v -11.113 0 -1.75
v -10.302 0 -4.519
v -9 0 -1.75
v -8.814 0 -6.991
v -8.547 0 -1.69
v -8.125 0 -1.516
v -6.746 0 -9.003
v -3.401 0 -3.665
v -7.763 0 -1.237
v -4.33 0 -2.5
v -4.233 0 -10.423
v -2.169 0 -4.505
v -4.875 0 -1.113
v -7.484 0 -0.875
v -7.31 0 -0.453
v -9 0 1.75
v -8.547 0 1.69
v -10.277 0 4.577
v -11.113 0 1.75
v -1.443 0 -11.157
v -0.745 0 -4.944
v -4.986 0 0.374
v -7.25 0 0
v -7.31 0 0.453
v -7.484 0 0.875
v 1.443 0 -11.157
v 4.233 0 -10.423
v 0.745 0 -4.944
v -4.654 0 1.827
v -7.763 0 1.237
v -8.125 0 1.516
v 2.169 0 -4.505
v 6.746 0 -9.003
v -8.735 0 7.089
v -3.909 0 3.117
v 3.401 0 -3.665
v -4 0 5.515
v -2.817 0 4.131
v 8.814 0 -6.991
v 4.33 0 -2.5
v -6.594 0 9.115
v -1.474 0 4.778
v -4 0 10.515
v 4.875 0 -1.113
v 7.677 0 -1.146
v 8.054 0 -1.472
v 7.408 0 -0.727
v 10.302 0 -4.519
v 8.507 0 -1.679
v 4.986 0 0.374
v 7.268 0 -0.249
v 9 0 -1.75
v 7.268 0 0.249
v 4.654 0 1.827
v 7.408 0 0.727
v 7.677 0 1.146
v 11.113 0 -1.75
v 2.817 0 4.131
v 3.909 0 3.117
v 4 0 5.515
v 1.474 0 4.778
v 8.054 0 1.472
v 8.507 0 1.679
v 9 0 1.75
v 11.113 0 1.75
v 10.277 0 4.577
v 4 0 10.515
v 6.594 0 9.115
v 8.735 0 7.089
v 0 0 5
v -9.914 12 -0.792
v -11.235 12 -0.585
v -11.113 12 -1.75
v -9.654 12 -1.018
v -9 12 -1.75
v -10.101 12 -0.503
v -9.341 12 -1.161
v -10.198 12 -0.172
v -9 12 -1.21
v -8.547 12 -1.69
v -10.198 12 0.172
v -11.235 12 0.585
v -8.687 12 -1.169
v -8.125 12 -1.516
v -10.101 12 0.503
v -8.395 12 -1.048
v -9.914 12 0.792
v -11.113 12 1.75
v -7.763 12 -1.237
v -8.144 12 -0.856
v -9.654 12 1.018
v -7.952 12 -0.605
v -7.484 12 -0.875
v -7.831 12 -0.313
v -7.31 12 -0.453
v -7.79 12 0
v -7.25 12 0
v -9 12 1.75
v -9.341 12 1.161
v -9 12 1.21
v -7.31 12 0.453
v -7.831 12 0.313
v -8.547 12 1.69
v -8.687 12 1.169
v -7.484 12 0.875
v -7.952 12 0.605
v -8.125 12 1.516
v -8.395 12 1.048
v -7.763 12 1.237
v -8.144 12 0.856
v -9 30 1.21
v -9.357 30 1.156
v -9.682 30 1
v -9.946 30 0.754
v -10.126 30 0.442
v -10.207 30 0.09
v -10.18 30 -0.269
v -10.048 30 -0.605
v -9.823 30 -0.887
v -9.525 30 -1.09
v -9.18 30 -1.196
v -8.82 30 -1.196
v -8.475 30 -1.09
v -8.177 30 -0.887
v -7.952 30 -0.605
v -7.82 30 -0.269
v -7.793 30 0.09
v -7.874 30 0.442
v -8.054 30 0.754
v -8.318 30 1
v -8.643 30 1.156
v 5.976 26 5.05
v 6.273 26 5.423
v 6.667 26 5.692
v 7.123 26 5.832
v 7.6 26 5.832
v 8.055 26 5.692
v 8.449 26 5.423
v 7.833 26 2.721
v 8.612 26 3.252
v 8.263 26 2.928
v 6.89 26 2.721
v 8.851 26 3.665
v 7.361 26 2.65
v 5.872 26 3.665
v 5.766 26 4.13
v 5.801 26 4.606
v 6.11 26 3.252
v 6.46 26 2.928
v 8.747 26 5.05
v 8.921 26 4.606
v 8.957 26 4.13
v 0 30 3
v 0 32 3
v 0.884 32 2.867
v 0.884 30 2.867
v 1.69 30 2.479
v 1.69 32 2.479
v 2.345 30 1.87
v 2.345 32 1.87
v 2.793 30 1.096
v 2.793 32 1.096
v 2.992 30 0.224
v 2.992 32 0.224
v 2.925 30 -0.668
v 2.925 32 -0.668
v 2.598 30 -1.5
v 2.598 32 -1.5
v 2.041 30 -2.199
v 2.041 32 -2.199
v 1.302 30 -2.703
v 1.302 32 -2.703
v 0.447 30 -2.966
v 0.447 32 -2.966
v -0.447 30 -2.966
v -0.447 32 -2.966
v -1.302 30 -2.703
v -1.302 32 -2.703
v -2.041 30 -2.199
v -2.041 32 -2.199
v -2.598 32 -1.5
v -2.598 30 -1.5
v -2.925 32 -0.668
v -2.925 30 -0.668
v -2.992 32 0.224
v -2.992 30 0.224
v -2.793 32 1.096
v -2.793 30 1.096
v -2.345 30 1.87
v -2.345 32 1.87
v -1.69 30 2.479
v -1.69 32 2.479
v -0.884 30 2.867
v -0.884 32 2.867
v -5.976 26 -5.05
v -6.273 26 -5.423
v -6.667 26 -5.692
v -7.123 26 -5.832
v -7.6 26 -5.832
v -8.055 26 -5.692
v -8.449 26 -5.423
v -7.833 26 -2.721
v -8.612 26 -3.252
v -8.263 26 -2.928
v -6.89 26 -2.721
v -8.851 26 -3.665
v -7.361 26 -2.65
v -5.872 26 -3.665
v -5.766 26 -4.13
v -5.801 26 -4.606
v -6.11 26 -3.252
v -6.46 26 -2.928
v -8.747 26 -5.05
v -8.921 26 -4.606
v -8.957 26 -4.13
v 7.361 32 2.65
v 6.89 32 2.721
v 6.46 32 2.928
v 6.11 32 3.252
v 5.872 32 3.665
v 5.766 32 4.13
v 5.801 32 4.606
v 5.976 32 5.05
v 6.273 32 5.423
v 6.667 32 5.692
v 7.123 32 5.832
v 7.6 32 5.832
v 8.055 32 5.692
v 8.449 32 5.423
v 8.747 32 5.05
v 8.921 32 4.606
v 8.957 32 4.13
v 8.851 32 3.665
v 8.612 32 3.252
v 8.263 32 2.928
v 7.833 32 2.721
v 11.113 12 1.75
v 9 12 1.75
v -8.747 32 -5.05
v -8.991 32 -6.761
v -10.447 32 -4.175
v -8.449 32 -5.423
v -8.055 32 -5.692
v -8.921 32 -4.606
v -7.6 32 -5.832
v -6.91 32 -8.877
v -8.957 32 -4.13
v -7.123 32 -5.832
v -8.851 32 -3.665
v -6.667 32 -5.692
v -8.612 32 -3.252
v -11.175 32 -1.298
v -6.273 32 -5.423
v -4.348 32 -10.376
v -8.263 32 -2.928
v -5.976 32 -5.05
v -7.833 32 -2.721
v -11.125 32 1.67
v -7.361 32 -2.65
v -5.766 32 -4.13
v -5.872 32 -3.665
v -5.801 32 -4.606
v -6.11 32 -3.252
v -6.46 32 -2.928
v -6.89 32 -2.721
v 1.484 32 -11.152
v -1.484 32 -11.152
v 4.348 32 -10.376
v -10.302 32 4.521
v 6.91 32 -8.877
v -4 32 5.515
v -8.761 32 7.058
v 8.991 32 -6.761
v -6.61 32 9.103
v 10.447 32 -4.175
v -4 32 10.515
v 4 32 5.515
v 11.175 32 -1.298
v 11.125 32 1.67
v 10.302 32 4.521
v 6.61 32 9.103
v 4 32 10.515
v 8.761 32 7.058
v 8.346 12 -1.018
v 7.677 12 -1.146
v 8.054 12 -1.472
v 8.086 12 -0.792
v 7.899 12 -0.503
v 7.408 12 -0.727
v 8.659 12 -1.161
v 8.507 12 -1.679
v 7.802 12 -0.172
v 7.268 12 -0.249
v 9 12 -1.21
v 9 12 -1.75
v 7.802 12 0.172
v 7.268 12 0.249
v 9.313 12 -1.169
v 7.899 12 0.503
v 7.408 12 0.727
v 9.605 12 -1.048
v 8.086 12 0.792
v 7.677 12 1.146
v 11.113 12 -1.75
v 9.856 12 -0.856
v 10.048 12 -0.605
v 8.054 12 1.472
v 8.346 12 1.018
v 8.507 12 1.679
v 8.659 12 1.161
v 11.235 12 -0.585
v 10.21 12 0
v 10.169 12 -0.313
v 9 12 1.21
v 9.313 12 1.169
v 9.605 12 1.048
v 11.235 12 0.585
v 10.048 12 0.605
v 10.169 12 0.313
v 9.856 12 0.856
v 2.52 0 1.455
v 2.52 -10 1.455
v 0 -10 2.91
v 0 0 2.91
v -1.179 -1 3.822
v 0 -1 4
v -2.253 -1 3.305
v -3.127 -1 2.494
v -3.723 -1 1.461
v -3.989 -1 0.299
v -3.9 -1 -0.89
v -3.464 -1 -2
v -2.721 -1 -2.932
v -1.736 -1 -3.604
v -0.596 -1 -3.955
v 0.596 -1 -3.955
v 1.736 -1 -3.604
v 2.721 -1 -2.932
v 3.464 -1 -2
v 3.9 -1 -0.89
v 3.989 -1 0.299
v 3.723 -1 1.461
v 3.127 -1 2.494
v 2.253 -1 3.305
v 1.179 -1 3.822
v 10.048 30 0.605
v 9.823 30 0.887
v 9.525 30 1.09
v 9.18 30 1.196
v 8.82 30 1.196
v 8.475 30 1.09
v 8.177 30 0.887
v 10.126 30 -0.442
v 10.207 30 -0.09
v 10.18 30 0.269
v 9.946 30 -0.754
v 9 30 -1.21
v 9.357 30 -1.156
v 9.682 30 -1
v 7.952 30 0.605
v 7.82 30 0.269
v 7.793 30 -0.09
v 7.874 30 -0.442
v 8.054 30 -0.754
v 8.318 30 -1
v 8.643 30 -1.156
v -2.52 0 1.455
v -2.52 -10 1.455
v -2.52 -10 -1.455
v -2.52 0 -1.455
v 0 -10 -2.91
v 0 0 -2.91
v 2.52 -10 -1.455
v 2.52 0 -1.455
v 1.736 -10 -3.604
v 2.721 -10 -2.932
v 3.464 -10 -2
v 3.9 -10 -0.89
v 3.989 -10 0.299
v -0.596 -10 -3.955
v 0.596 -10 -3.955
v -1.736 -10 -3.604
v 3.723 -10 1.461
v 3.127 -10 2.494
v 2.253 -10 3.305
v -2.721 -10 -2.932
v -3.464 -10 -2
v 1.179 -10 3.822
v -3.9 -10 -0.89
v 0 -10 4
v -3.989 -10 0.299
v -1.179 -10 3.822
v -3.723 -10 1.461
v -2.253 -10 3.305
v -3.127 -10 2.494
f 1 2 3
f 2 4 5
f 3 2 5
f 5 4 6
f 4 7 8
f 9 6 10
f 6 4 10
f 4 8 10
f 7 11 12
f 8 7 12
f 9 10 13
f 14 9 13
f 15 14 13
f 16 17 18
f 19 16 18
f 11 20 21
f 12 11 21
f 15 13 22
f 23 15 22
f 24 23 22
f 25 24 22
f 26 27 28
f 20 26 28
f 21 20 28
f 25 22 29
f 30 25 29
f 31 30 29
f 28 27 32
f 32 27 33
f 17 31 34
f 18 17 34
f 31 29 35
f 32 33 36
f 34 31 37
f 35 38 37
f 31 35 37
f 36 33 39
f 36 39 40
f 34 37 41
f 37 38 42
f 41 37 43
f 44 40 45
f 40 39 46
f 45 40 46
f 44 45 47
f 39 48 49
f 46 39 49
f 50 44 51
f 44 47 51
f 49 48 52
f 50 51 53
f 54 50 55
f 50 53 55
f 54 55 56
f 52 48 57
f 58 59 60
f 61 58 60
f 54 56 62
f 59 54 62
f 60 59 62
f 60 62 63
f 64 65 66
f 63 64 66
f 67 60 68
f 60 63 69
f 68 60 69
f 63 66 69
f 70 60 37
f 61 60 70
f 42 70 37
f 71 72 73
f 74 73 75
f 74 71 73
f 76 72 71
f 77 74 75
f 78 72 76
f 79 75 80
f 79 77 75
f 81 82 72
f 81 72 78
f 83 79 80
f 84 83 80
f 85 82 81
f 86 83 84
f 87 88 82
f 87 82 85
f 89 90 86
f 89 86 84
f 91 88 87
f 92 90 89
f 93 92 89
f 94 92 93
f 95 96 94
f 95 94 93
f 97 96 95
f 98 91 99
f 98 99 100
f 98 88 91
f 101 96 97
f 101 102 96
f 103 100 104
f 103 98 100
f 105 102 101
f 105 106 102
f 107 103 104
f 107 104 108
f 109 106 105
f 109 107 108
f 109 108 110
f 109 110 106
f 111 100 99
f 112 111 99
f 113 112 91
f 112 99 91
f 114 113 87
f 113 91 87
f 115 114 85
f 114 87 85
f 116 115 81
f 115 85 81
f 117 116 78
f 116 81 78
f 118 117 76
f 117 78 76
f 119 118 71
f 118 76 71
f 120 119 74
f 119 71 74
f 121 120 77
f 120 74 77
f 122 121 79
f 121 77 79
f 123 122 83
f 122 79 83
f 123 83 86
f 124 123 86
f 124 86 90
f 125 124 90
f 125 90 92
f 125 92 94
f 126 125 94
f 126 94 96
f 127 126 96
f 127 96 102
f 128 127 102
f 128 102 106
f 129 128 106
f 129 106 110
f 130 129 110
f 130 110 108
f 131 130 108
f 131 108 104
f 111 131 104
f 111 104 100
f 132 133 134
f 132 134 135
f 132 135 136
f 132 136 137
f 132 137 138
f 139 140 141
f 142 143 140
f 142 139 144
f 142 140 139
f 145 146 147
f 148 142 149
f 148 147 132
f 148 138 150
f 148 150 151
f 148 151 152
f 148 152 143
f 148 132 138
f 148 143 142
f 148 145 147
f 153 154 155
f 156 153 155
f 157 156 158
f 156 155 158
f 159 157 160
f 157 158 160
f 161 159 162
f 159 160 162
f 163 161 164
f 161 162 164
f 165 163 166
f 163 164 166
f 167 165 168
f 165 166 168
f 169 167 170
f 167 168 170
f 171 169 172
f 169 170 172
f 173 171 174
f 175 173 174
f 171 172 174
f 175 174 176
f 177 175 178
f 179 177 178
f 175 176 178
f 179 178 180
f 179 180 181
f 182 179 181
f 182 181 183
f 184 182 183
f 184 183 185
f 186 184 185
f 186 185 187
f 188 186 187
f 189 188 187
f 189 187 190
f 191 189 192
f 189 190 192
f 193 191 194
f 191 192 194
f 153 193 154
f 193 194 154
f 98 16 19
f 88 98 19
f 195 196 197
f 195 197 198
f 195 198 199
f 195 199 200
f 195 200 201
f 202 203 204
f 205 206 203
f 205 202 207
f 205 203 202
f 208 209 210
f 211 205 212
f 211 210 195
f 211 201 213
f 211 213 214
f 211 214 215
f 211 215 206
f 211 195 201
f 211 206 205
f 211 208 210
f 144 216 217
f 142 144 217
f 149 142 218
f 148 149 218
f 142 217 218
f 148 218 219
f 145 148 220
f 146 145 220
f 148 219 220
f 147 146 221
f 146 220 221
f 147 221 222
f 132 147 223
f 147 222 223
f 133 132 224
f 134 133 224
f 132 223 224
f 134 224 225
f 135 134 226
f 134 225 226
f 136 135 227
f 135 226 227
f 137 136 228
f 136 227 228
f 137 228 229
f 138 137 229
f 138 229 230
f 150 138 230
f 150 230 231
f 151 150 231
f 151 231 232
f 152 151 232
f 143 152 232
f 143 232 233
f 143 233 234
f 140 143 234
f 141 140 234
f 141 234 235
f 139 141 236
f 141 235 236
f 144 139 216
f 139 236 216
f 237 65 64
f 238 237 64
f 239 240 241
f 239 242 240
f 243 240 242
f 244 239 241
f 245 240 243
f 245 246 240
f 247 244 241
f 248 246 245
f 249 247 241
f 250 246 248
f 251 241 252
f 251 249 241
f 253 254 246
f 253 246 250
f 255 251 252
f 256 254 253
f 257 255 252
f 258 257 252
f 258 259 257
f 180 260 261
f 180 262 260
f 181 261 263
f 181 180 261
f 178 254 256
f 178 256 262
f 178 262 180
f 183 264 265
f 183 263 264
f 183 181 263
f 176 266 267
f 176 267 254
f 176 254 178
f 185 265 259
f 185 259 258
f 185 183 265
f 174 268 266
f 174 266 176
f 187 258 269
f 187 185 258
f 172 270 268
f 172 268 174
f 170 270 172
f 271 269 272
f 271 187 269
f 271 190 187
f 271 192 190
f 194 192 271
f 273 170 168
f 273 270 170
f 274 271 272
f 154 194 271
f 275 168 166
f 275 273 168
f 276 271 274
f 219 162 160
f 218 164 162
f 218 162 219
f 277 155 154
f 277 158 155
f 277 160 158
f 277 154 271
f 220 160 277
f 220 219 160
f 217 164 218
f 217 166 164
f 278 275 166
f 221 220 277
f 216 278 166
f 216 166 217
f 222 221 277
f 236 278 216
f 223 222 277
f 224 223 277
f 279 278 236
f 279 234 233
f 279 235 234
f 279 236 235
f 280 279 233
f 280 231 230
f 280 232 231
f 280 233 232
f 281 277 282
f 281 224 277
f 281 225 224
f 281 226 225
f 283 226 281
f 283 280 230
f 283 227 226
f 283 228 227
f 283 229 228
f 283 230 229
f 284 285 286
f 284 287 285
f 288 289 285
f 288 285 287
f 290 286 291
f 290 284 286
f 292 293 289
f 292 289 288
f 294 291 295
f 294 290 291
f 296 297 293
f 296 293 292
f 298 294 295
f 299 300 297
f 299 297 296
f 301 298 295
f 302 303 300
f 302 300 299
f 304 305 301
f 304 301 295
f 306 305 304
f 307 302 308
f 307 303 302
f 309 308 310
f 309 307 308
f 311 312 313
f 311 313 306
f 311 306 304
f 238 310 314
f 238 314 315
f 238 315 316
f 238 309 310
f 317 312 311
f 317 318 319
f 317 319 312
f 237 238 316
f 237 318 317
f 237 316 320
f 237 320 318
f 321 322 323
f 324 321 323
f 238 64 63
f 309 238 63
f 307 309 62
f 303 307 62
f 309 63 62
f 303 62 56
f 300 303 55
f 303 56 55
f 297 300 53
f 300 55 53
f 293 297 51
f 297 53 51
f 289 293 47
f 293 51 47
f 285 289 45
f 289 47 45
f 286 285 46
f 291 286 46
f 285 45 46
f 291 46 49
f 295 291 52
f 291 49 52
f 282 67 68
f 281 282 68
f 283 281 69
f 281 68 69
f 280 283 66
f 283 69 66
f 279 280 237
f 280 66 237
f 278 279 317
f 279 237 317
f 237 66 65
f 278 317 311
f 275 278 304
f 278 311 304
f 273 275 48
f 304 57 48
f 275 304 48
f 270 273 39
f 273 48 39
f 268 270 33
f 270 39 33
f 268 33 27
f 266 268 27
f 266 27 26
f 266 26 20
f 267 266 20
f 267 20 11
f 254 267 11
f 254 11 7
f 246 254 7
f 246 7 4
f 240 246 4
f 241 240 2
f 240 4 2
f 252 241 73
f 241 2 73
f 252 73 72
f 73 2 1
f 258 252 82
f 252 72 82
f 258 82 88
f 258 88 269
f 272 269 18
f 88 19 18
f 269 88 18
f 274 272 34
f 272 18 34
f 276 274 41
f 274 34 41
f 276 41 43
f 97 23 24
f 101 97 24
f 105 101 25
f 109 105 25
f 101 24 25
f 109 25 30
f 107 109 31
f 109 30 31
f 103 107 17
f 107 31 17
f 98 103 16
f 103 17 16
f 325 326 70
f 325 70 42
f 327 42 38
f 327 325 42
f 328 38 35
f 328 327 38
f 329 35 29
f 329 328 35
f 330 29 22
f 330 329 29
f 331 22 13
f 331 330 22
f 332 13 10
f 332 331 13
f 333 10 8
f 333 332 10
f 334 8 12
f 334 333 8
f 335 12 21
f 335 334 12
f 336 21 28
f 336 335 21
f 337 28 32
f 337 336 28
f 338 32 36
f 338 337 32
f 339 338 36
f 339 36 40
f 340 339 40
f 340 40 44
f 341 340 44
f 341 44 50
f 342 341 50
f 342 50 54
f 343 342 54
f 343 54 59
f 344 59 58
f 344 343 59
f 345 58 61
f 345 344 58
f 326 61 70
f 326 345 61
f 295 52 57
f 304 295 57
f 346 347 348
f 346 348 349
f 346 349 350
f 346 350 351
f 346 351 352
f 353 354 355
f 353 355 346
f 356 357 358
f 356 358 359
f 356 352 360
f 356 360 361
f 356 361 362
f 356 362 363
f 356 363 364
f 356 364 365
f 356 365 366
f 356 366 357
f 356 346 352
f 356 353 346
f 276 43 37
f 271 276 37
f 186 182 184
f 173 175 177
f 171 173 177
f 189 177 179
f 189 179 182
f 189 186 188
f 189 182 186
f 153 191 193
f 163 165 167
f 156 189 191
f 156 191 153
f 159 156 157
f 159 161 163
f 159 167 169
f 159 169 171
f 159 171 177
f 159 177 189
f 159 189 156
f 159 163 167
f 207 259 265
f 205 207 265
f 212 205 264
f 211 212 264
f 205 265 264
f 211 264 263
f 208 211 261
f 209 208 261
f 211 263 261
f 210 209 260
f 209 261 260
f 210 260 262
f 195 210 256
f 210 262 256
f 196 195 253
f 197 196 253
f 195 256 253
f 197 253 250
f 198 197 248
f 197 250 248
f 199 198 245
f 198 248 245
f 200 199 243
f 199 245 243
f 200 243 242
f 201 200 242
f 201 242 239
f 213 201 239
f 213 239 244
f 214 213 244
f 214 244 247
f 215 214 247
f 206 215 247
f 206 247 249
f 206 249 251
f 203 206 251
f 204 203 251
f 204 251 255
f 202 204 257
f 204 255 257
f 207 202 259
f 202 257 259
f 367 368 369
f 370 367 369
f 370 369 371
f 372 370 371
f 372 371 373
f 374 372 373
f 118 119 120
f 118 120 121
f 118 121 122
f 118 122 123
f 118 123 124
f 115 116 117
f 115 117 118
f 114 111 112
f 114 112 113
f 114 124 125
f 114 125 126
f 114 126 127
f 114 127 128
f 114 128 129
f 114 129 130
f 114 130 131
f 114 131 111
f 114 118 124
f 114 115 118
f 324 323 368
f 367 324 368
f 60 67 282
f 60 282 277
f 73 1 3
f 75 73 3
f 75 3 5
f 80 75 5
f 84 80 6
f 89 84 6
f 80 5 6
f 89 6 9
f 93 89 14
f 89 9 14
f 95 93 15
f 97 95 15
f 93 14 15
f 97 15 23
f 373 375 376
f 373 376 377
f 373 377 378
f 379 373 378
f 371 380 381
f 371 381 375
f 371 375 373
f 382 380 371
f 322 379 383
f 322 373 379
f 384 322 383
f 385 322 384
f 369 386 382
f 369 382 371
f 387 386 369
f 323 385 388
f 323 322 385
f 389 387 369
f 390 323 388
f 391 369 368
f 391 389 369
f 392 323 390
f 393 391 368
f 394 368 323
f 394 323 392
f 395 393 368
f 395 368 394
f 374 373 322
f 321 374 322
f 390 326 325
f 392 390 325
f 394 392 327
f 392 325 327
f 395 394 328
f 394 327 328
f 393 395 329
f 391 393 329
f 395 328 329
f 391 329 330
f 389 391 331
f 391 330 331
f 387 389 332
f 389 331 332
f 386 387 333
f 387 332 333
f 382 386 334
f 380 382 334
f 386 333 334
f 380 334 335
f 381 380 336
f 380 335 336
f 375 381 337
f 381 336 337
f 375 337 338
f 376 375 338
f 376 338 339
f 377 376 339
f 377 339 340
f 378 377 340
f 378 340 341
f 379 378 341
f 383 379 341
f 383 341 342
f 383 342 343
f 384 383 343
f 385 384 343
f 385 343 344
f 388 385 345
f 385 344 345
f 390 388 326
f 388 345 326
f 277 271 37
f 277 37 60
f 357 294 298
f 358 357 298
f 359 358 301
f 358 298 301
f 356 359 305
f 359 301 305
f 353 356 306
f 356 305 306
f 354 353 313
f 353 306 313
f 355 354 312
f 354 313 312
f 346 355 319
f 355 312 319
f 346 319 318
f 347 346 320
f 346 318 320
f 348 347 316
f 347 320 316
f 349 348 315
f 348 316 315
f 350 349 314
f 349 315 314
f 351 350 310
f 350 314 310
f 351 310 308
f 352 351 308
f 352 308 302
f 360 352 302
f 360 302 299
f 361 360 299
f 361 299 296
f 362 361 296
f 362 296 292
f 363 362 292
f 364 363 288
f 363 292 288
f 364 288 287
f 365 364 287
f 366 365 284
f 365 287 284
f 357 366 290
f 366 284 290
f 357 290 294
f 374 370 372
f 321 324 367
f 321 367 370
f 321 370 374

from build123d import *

# Parameters (mm, degrees)
SKETCH_1_R          = 11.25
EXTRUDE_1_DEPTH     = 32
SKETCH_3_R          = 1.21
CUT_EXTRUDE_1_DEPTH = 30
SKETCH_4_R          = 4
EXTRUDE_2_DEPTH     = 10
CUT_EXTRUDE_2_DEPTH = 10
CHAMFER_1_SIZE      = 1
SKETCH_6_W          = 8
SKETCH_6_H          = 5
CUT_EXTRUDE_3_DEPTH = 45.912414765
SKETCH_7_R          = 1.6
CUT_EXTRUDE_4_DEPTH = 6
SKETCH_8_R          = 3
CUT_EXTRUDE_5_DEPTH = 2
CUT_EXTRUDE_6_DEPTH = 12


with BuildPart() as part:
    # 草图1 → 凸台-拉伸1 (new body)
    with BuildSketch(Plane(origin=(0, 0, 0), x_dir=(1, 0, 0), z_dir=(0, 1, 0))):
        with Locations(Location((0, 0, 0), (0, 0, 270))):
            Circle(SKETCH_1_R)
    extrude(amount=EXTRUDE_1_DEPTH)

    # 草图3 → 切除-拉伸1 (cut)
    with BuildSketch(Plane.XZ):
        with Locations(Location((9, 0, 0), (0, 0, 270))):
            Circle(SKETCH_3_R)
        with Locations(Location((-9, 0, 0), (0, 0, 90))):
            Circle(SKETCH_3_R)
    extrude(amount=-CUT_EXTRUDE_1_DEPTH, mode=Mode.SUBTRACT)

    # 草图4 → 凸台-拉伸2 (add)
    with BuildSketch(Plane.XZ):
        with Locations(Location((0, 0, 0), (0, 0, 90))):
            Circle(SKETCH_4_R)
    extrude(amount=EXTRUDE_2_DEPTH)

    # 草图5 → 切除-拉伸2 (cut)
    with BuildSketch(Plane.XZ.offset(10)):
        Polygon((0, -2.909845357), (2.52, -1.454922678), (2.52, 1.454922678), (0, 2.909845357), (-2.52, 1.454922678), (-2.52, -1.454922678), align=None)
    extrude(amount=-CUT_EXTRUDE_2_DEPTH, mode=Mode.SUBTRACT)

    # 倒角1
    chamfer_1_edges = [part.edges().sort_by_distance(p)[0] for p in [
        (0, 0, -4),
    ]]
    chamfer(chamfer_1_edges, length=CHAMFER_1_SIZE)

    # 草图6 → 切除-拉伸3 (cut, through all)
    with BuildSketch(Plane(origin=(0, 32, 0), x_dir=(1, 0, 0), z_dir=(0, 1, 0))):
        with Locations((0, -8.014870422)):
            Rectangle(SKETCH_6_W, SKETCH_6_H)
        with BuildLine():
            Line((4, -10.514870422), (-4, -10.514870422))
            ThreePointArc((-4, -10.514870422), (0, -11.25), (4, -10.514870422))
        make_face()
    extrude(amount=-CUT_EXTRUDE_3_DEPTH, mode=Mode.SUBTRACT)

    # 草图7 → 切除-拉伸4 (cut)
    with BuildSketch(Plane(origin=(0, 32, 0), x_dir=(1, 0, 0), z_dir=(0, 1, 0))):
        with Locations(Location((-7.361215932, 4.25, 0), (0, 0, 270))):
            Circle(SKETCH_7_R)
        with Locations(Location((7.361215932, -4.25, 0), (0, 0, 90))):
            Circle(SKETCH_7_R)
    extrude(amount=-CUT_EXTRUDE_4_DEPTH, mode=Mode.SUBTRACT)

    # 草图8 → 切除-拉伸5 (cut)
    with BuildSketch(Plane(origin=(0, 32, 0), x_dir=(1, 0, 0), z_dir=(0, 1, 0))):
        with Locations(Location((0, 0, 0), (0, 0, 270))):
            Circle(SKETCH_8_R)
    extrude(amount=-CUT_EXTRUDE_5_DEPTH, mode=Mode.SUBTRACT)

    # 草图9 → 切除-拉伸6 (cut)
    with BuildSketch(Plane.XZ):
        with BuildLine():
            ThreePointArc((-11.113055385, 1.75), (-11.25, 0), (-11.113055385, -1.75))
            Line((-11.113055385, -1.75), (-9, -1.75))
            ThreePointArc((-9, -1.75), (-10.75, 0), (-9, 1.75))
            Line((-9, 1.75), (-11.113055385, 1.75))
        make_face()
        with BuildLine():
            ThreePointArc((-9, 1.75), (-10.75, 0), (-9, -1.75))
            Line((-9, -1.75), (-9, -1.21))
            ThreePointArc((-9, -1.21), (-10.21, 0), (-9, 1.21))
            Line((-9, 1.21), (-9, 1.75))
        make_face()
        with BuildLine():
            Line((-9, -1.21), (-9, -1.75))
            ThreePointArc((-9, -1.75), (-7.762563133, -1.237436867), (-7.25, 0))
            ThreePointArc((-7.25, 0), (-7.762563133, 1.237436867), (-9, 1.75))
            Line((-9, 1.75), (-9, 1.21))
            ThreePointArc((-9, 1.21), (-8.144400795, 0.855599205), (-7.79, 0))
            ThreePointArc((-7.79, 0), (-8.144400795, -0.855599205), (-9, -1.21))
        make_face()
        with BuildLine():
            ThreePointArc((9, 1.75), (7.25, 0), (9, -1.75))
            Line((9, -1.75), (9, -1.21))
            ThreePointArc((9, -1.21), (7.79, 0), (9, 1.21))
            Line((9, 1.21), (9, 1.75))
        make_face()
        with BuildLine():
            Line((9, -1.21), (9, -1.75))
            ThreePointArc((9, -1.75), (10.237436867, -1.237436867), (10.75, 0))
            ThreePointArc((10.75, 0), (10.237436867, 1.237436867), (9, 1.75))
            Line((9, 1.75), (9, 1.21))
            ThreePointArc((9, 1.21), (9.855599205, 0.855599205), (10.21, 0))
            ThreePointArc((10.21, 0), (9.855599205, -0.855599205), (9, -1.21))
        make_face()
        with BuildLine():
            Line((9, -1.75), (11.113055385, -1.75))
            ThreePointArc((11.113055385, -1.75), (11.25, 0), (11.113055385, 1.75))
            Line((11.113055385, 1.75), (9, 1.75))
            ThreePointArc((9, 1.75), (10.237436867, 1.237436867), (10.75, 0))
            ThreePointArc((10.75, 0), (10.237436867, -1.237436867), (9, -1.75))
        make_face()
    extrude(amount=-CUT_EXTRUDE_6_DEPTH, mode=Mode.SUBTRACT)


solid = part.part
